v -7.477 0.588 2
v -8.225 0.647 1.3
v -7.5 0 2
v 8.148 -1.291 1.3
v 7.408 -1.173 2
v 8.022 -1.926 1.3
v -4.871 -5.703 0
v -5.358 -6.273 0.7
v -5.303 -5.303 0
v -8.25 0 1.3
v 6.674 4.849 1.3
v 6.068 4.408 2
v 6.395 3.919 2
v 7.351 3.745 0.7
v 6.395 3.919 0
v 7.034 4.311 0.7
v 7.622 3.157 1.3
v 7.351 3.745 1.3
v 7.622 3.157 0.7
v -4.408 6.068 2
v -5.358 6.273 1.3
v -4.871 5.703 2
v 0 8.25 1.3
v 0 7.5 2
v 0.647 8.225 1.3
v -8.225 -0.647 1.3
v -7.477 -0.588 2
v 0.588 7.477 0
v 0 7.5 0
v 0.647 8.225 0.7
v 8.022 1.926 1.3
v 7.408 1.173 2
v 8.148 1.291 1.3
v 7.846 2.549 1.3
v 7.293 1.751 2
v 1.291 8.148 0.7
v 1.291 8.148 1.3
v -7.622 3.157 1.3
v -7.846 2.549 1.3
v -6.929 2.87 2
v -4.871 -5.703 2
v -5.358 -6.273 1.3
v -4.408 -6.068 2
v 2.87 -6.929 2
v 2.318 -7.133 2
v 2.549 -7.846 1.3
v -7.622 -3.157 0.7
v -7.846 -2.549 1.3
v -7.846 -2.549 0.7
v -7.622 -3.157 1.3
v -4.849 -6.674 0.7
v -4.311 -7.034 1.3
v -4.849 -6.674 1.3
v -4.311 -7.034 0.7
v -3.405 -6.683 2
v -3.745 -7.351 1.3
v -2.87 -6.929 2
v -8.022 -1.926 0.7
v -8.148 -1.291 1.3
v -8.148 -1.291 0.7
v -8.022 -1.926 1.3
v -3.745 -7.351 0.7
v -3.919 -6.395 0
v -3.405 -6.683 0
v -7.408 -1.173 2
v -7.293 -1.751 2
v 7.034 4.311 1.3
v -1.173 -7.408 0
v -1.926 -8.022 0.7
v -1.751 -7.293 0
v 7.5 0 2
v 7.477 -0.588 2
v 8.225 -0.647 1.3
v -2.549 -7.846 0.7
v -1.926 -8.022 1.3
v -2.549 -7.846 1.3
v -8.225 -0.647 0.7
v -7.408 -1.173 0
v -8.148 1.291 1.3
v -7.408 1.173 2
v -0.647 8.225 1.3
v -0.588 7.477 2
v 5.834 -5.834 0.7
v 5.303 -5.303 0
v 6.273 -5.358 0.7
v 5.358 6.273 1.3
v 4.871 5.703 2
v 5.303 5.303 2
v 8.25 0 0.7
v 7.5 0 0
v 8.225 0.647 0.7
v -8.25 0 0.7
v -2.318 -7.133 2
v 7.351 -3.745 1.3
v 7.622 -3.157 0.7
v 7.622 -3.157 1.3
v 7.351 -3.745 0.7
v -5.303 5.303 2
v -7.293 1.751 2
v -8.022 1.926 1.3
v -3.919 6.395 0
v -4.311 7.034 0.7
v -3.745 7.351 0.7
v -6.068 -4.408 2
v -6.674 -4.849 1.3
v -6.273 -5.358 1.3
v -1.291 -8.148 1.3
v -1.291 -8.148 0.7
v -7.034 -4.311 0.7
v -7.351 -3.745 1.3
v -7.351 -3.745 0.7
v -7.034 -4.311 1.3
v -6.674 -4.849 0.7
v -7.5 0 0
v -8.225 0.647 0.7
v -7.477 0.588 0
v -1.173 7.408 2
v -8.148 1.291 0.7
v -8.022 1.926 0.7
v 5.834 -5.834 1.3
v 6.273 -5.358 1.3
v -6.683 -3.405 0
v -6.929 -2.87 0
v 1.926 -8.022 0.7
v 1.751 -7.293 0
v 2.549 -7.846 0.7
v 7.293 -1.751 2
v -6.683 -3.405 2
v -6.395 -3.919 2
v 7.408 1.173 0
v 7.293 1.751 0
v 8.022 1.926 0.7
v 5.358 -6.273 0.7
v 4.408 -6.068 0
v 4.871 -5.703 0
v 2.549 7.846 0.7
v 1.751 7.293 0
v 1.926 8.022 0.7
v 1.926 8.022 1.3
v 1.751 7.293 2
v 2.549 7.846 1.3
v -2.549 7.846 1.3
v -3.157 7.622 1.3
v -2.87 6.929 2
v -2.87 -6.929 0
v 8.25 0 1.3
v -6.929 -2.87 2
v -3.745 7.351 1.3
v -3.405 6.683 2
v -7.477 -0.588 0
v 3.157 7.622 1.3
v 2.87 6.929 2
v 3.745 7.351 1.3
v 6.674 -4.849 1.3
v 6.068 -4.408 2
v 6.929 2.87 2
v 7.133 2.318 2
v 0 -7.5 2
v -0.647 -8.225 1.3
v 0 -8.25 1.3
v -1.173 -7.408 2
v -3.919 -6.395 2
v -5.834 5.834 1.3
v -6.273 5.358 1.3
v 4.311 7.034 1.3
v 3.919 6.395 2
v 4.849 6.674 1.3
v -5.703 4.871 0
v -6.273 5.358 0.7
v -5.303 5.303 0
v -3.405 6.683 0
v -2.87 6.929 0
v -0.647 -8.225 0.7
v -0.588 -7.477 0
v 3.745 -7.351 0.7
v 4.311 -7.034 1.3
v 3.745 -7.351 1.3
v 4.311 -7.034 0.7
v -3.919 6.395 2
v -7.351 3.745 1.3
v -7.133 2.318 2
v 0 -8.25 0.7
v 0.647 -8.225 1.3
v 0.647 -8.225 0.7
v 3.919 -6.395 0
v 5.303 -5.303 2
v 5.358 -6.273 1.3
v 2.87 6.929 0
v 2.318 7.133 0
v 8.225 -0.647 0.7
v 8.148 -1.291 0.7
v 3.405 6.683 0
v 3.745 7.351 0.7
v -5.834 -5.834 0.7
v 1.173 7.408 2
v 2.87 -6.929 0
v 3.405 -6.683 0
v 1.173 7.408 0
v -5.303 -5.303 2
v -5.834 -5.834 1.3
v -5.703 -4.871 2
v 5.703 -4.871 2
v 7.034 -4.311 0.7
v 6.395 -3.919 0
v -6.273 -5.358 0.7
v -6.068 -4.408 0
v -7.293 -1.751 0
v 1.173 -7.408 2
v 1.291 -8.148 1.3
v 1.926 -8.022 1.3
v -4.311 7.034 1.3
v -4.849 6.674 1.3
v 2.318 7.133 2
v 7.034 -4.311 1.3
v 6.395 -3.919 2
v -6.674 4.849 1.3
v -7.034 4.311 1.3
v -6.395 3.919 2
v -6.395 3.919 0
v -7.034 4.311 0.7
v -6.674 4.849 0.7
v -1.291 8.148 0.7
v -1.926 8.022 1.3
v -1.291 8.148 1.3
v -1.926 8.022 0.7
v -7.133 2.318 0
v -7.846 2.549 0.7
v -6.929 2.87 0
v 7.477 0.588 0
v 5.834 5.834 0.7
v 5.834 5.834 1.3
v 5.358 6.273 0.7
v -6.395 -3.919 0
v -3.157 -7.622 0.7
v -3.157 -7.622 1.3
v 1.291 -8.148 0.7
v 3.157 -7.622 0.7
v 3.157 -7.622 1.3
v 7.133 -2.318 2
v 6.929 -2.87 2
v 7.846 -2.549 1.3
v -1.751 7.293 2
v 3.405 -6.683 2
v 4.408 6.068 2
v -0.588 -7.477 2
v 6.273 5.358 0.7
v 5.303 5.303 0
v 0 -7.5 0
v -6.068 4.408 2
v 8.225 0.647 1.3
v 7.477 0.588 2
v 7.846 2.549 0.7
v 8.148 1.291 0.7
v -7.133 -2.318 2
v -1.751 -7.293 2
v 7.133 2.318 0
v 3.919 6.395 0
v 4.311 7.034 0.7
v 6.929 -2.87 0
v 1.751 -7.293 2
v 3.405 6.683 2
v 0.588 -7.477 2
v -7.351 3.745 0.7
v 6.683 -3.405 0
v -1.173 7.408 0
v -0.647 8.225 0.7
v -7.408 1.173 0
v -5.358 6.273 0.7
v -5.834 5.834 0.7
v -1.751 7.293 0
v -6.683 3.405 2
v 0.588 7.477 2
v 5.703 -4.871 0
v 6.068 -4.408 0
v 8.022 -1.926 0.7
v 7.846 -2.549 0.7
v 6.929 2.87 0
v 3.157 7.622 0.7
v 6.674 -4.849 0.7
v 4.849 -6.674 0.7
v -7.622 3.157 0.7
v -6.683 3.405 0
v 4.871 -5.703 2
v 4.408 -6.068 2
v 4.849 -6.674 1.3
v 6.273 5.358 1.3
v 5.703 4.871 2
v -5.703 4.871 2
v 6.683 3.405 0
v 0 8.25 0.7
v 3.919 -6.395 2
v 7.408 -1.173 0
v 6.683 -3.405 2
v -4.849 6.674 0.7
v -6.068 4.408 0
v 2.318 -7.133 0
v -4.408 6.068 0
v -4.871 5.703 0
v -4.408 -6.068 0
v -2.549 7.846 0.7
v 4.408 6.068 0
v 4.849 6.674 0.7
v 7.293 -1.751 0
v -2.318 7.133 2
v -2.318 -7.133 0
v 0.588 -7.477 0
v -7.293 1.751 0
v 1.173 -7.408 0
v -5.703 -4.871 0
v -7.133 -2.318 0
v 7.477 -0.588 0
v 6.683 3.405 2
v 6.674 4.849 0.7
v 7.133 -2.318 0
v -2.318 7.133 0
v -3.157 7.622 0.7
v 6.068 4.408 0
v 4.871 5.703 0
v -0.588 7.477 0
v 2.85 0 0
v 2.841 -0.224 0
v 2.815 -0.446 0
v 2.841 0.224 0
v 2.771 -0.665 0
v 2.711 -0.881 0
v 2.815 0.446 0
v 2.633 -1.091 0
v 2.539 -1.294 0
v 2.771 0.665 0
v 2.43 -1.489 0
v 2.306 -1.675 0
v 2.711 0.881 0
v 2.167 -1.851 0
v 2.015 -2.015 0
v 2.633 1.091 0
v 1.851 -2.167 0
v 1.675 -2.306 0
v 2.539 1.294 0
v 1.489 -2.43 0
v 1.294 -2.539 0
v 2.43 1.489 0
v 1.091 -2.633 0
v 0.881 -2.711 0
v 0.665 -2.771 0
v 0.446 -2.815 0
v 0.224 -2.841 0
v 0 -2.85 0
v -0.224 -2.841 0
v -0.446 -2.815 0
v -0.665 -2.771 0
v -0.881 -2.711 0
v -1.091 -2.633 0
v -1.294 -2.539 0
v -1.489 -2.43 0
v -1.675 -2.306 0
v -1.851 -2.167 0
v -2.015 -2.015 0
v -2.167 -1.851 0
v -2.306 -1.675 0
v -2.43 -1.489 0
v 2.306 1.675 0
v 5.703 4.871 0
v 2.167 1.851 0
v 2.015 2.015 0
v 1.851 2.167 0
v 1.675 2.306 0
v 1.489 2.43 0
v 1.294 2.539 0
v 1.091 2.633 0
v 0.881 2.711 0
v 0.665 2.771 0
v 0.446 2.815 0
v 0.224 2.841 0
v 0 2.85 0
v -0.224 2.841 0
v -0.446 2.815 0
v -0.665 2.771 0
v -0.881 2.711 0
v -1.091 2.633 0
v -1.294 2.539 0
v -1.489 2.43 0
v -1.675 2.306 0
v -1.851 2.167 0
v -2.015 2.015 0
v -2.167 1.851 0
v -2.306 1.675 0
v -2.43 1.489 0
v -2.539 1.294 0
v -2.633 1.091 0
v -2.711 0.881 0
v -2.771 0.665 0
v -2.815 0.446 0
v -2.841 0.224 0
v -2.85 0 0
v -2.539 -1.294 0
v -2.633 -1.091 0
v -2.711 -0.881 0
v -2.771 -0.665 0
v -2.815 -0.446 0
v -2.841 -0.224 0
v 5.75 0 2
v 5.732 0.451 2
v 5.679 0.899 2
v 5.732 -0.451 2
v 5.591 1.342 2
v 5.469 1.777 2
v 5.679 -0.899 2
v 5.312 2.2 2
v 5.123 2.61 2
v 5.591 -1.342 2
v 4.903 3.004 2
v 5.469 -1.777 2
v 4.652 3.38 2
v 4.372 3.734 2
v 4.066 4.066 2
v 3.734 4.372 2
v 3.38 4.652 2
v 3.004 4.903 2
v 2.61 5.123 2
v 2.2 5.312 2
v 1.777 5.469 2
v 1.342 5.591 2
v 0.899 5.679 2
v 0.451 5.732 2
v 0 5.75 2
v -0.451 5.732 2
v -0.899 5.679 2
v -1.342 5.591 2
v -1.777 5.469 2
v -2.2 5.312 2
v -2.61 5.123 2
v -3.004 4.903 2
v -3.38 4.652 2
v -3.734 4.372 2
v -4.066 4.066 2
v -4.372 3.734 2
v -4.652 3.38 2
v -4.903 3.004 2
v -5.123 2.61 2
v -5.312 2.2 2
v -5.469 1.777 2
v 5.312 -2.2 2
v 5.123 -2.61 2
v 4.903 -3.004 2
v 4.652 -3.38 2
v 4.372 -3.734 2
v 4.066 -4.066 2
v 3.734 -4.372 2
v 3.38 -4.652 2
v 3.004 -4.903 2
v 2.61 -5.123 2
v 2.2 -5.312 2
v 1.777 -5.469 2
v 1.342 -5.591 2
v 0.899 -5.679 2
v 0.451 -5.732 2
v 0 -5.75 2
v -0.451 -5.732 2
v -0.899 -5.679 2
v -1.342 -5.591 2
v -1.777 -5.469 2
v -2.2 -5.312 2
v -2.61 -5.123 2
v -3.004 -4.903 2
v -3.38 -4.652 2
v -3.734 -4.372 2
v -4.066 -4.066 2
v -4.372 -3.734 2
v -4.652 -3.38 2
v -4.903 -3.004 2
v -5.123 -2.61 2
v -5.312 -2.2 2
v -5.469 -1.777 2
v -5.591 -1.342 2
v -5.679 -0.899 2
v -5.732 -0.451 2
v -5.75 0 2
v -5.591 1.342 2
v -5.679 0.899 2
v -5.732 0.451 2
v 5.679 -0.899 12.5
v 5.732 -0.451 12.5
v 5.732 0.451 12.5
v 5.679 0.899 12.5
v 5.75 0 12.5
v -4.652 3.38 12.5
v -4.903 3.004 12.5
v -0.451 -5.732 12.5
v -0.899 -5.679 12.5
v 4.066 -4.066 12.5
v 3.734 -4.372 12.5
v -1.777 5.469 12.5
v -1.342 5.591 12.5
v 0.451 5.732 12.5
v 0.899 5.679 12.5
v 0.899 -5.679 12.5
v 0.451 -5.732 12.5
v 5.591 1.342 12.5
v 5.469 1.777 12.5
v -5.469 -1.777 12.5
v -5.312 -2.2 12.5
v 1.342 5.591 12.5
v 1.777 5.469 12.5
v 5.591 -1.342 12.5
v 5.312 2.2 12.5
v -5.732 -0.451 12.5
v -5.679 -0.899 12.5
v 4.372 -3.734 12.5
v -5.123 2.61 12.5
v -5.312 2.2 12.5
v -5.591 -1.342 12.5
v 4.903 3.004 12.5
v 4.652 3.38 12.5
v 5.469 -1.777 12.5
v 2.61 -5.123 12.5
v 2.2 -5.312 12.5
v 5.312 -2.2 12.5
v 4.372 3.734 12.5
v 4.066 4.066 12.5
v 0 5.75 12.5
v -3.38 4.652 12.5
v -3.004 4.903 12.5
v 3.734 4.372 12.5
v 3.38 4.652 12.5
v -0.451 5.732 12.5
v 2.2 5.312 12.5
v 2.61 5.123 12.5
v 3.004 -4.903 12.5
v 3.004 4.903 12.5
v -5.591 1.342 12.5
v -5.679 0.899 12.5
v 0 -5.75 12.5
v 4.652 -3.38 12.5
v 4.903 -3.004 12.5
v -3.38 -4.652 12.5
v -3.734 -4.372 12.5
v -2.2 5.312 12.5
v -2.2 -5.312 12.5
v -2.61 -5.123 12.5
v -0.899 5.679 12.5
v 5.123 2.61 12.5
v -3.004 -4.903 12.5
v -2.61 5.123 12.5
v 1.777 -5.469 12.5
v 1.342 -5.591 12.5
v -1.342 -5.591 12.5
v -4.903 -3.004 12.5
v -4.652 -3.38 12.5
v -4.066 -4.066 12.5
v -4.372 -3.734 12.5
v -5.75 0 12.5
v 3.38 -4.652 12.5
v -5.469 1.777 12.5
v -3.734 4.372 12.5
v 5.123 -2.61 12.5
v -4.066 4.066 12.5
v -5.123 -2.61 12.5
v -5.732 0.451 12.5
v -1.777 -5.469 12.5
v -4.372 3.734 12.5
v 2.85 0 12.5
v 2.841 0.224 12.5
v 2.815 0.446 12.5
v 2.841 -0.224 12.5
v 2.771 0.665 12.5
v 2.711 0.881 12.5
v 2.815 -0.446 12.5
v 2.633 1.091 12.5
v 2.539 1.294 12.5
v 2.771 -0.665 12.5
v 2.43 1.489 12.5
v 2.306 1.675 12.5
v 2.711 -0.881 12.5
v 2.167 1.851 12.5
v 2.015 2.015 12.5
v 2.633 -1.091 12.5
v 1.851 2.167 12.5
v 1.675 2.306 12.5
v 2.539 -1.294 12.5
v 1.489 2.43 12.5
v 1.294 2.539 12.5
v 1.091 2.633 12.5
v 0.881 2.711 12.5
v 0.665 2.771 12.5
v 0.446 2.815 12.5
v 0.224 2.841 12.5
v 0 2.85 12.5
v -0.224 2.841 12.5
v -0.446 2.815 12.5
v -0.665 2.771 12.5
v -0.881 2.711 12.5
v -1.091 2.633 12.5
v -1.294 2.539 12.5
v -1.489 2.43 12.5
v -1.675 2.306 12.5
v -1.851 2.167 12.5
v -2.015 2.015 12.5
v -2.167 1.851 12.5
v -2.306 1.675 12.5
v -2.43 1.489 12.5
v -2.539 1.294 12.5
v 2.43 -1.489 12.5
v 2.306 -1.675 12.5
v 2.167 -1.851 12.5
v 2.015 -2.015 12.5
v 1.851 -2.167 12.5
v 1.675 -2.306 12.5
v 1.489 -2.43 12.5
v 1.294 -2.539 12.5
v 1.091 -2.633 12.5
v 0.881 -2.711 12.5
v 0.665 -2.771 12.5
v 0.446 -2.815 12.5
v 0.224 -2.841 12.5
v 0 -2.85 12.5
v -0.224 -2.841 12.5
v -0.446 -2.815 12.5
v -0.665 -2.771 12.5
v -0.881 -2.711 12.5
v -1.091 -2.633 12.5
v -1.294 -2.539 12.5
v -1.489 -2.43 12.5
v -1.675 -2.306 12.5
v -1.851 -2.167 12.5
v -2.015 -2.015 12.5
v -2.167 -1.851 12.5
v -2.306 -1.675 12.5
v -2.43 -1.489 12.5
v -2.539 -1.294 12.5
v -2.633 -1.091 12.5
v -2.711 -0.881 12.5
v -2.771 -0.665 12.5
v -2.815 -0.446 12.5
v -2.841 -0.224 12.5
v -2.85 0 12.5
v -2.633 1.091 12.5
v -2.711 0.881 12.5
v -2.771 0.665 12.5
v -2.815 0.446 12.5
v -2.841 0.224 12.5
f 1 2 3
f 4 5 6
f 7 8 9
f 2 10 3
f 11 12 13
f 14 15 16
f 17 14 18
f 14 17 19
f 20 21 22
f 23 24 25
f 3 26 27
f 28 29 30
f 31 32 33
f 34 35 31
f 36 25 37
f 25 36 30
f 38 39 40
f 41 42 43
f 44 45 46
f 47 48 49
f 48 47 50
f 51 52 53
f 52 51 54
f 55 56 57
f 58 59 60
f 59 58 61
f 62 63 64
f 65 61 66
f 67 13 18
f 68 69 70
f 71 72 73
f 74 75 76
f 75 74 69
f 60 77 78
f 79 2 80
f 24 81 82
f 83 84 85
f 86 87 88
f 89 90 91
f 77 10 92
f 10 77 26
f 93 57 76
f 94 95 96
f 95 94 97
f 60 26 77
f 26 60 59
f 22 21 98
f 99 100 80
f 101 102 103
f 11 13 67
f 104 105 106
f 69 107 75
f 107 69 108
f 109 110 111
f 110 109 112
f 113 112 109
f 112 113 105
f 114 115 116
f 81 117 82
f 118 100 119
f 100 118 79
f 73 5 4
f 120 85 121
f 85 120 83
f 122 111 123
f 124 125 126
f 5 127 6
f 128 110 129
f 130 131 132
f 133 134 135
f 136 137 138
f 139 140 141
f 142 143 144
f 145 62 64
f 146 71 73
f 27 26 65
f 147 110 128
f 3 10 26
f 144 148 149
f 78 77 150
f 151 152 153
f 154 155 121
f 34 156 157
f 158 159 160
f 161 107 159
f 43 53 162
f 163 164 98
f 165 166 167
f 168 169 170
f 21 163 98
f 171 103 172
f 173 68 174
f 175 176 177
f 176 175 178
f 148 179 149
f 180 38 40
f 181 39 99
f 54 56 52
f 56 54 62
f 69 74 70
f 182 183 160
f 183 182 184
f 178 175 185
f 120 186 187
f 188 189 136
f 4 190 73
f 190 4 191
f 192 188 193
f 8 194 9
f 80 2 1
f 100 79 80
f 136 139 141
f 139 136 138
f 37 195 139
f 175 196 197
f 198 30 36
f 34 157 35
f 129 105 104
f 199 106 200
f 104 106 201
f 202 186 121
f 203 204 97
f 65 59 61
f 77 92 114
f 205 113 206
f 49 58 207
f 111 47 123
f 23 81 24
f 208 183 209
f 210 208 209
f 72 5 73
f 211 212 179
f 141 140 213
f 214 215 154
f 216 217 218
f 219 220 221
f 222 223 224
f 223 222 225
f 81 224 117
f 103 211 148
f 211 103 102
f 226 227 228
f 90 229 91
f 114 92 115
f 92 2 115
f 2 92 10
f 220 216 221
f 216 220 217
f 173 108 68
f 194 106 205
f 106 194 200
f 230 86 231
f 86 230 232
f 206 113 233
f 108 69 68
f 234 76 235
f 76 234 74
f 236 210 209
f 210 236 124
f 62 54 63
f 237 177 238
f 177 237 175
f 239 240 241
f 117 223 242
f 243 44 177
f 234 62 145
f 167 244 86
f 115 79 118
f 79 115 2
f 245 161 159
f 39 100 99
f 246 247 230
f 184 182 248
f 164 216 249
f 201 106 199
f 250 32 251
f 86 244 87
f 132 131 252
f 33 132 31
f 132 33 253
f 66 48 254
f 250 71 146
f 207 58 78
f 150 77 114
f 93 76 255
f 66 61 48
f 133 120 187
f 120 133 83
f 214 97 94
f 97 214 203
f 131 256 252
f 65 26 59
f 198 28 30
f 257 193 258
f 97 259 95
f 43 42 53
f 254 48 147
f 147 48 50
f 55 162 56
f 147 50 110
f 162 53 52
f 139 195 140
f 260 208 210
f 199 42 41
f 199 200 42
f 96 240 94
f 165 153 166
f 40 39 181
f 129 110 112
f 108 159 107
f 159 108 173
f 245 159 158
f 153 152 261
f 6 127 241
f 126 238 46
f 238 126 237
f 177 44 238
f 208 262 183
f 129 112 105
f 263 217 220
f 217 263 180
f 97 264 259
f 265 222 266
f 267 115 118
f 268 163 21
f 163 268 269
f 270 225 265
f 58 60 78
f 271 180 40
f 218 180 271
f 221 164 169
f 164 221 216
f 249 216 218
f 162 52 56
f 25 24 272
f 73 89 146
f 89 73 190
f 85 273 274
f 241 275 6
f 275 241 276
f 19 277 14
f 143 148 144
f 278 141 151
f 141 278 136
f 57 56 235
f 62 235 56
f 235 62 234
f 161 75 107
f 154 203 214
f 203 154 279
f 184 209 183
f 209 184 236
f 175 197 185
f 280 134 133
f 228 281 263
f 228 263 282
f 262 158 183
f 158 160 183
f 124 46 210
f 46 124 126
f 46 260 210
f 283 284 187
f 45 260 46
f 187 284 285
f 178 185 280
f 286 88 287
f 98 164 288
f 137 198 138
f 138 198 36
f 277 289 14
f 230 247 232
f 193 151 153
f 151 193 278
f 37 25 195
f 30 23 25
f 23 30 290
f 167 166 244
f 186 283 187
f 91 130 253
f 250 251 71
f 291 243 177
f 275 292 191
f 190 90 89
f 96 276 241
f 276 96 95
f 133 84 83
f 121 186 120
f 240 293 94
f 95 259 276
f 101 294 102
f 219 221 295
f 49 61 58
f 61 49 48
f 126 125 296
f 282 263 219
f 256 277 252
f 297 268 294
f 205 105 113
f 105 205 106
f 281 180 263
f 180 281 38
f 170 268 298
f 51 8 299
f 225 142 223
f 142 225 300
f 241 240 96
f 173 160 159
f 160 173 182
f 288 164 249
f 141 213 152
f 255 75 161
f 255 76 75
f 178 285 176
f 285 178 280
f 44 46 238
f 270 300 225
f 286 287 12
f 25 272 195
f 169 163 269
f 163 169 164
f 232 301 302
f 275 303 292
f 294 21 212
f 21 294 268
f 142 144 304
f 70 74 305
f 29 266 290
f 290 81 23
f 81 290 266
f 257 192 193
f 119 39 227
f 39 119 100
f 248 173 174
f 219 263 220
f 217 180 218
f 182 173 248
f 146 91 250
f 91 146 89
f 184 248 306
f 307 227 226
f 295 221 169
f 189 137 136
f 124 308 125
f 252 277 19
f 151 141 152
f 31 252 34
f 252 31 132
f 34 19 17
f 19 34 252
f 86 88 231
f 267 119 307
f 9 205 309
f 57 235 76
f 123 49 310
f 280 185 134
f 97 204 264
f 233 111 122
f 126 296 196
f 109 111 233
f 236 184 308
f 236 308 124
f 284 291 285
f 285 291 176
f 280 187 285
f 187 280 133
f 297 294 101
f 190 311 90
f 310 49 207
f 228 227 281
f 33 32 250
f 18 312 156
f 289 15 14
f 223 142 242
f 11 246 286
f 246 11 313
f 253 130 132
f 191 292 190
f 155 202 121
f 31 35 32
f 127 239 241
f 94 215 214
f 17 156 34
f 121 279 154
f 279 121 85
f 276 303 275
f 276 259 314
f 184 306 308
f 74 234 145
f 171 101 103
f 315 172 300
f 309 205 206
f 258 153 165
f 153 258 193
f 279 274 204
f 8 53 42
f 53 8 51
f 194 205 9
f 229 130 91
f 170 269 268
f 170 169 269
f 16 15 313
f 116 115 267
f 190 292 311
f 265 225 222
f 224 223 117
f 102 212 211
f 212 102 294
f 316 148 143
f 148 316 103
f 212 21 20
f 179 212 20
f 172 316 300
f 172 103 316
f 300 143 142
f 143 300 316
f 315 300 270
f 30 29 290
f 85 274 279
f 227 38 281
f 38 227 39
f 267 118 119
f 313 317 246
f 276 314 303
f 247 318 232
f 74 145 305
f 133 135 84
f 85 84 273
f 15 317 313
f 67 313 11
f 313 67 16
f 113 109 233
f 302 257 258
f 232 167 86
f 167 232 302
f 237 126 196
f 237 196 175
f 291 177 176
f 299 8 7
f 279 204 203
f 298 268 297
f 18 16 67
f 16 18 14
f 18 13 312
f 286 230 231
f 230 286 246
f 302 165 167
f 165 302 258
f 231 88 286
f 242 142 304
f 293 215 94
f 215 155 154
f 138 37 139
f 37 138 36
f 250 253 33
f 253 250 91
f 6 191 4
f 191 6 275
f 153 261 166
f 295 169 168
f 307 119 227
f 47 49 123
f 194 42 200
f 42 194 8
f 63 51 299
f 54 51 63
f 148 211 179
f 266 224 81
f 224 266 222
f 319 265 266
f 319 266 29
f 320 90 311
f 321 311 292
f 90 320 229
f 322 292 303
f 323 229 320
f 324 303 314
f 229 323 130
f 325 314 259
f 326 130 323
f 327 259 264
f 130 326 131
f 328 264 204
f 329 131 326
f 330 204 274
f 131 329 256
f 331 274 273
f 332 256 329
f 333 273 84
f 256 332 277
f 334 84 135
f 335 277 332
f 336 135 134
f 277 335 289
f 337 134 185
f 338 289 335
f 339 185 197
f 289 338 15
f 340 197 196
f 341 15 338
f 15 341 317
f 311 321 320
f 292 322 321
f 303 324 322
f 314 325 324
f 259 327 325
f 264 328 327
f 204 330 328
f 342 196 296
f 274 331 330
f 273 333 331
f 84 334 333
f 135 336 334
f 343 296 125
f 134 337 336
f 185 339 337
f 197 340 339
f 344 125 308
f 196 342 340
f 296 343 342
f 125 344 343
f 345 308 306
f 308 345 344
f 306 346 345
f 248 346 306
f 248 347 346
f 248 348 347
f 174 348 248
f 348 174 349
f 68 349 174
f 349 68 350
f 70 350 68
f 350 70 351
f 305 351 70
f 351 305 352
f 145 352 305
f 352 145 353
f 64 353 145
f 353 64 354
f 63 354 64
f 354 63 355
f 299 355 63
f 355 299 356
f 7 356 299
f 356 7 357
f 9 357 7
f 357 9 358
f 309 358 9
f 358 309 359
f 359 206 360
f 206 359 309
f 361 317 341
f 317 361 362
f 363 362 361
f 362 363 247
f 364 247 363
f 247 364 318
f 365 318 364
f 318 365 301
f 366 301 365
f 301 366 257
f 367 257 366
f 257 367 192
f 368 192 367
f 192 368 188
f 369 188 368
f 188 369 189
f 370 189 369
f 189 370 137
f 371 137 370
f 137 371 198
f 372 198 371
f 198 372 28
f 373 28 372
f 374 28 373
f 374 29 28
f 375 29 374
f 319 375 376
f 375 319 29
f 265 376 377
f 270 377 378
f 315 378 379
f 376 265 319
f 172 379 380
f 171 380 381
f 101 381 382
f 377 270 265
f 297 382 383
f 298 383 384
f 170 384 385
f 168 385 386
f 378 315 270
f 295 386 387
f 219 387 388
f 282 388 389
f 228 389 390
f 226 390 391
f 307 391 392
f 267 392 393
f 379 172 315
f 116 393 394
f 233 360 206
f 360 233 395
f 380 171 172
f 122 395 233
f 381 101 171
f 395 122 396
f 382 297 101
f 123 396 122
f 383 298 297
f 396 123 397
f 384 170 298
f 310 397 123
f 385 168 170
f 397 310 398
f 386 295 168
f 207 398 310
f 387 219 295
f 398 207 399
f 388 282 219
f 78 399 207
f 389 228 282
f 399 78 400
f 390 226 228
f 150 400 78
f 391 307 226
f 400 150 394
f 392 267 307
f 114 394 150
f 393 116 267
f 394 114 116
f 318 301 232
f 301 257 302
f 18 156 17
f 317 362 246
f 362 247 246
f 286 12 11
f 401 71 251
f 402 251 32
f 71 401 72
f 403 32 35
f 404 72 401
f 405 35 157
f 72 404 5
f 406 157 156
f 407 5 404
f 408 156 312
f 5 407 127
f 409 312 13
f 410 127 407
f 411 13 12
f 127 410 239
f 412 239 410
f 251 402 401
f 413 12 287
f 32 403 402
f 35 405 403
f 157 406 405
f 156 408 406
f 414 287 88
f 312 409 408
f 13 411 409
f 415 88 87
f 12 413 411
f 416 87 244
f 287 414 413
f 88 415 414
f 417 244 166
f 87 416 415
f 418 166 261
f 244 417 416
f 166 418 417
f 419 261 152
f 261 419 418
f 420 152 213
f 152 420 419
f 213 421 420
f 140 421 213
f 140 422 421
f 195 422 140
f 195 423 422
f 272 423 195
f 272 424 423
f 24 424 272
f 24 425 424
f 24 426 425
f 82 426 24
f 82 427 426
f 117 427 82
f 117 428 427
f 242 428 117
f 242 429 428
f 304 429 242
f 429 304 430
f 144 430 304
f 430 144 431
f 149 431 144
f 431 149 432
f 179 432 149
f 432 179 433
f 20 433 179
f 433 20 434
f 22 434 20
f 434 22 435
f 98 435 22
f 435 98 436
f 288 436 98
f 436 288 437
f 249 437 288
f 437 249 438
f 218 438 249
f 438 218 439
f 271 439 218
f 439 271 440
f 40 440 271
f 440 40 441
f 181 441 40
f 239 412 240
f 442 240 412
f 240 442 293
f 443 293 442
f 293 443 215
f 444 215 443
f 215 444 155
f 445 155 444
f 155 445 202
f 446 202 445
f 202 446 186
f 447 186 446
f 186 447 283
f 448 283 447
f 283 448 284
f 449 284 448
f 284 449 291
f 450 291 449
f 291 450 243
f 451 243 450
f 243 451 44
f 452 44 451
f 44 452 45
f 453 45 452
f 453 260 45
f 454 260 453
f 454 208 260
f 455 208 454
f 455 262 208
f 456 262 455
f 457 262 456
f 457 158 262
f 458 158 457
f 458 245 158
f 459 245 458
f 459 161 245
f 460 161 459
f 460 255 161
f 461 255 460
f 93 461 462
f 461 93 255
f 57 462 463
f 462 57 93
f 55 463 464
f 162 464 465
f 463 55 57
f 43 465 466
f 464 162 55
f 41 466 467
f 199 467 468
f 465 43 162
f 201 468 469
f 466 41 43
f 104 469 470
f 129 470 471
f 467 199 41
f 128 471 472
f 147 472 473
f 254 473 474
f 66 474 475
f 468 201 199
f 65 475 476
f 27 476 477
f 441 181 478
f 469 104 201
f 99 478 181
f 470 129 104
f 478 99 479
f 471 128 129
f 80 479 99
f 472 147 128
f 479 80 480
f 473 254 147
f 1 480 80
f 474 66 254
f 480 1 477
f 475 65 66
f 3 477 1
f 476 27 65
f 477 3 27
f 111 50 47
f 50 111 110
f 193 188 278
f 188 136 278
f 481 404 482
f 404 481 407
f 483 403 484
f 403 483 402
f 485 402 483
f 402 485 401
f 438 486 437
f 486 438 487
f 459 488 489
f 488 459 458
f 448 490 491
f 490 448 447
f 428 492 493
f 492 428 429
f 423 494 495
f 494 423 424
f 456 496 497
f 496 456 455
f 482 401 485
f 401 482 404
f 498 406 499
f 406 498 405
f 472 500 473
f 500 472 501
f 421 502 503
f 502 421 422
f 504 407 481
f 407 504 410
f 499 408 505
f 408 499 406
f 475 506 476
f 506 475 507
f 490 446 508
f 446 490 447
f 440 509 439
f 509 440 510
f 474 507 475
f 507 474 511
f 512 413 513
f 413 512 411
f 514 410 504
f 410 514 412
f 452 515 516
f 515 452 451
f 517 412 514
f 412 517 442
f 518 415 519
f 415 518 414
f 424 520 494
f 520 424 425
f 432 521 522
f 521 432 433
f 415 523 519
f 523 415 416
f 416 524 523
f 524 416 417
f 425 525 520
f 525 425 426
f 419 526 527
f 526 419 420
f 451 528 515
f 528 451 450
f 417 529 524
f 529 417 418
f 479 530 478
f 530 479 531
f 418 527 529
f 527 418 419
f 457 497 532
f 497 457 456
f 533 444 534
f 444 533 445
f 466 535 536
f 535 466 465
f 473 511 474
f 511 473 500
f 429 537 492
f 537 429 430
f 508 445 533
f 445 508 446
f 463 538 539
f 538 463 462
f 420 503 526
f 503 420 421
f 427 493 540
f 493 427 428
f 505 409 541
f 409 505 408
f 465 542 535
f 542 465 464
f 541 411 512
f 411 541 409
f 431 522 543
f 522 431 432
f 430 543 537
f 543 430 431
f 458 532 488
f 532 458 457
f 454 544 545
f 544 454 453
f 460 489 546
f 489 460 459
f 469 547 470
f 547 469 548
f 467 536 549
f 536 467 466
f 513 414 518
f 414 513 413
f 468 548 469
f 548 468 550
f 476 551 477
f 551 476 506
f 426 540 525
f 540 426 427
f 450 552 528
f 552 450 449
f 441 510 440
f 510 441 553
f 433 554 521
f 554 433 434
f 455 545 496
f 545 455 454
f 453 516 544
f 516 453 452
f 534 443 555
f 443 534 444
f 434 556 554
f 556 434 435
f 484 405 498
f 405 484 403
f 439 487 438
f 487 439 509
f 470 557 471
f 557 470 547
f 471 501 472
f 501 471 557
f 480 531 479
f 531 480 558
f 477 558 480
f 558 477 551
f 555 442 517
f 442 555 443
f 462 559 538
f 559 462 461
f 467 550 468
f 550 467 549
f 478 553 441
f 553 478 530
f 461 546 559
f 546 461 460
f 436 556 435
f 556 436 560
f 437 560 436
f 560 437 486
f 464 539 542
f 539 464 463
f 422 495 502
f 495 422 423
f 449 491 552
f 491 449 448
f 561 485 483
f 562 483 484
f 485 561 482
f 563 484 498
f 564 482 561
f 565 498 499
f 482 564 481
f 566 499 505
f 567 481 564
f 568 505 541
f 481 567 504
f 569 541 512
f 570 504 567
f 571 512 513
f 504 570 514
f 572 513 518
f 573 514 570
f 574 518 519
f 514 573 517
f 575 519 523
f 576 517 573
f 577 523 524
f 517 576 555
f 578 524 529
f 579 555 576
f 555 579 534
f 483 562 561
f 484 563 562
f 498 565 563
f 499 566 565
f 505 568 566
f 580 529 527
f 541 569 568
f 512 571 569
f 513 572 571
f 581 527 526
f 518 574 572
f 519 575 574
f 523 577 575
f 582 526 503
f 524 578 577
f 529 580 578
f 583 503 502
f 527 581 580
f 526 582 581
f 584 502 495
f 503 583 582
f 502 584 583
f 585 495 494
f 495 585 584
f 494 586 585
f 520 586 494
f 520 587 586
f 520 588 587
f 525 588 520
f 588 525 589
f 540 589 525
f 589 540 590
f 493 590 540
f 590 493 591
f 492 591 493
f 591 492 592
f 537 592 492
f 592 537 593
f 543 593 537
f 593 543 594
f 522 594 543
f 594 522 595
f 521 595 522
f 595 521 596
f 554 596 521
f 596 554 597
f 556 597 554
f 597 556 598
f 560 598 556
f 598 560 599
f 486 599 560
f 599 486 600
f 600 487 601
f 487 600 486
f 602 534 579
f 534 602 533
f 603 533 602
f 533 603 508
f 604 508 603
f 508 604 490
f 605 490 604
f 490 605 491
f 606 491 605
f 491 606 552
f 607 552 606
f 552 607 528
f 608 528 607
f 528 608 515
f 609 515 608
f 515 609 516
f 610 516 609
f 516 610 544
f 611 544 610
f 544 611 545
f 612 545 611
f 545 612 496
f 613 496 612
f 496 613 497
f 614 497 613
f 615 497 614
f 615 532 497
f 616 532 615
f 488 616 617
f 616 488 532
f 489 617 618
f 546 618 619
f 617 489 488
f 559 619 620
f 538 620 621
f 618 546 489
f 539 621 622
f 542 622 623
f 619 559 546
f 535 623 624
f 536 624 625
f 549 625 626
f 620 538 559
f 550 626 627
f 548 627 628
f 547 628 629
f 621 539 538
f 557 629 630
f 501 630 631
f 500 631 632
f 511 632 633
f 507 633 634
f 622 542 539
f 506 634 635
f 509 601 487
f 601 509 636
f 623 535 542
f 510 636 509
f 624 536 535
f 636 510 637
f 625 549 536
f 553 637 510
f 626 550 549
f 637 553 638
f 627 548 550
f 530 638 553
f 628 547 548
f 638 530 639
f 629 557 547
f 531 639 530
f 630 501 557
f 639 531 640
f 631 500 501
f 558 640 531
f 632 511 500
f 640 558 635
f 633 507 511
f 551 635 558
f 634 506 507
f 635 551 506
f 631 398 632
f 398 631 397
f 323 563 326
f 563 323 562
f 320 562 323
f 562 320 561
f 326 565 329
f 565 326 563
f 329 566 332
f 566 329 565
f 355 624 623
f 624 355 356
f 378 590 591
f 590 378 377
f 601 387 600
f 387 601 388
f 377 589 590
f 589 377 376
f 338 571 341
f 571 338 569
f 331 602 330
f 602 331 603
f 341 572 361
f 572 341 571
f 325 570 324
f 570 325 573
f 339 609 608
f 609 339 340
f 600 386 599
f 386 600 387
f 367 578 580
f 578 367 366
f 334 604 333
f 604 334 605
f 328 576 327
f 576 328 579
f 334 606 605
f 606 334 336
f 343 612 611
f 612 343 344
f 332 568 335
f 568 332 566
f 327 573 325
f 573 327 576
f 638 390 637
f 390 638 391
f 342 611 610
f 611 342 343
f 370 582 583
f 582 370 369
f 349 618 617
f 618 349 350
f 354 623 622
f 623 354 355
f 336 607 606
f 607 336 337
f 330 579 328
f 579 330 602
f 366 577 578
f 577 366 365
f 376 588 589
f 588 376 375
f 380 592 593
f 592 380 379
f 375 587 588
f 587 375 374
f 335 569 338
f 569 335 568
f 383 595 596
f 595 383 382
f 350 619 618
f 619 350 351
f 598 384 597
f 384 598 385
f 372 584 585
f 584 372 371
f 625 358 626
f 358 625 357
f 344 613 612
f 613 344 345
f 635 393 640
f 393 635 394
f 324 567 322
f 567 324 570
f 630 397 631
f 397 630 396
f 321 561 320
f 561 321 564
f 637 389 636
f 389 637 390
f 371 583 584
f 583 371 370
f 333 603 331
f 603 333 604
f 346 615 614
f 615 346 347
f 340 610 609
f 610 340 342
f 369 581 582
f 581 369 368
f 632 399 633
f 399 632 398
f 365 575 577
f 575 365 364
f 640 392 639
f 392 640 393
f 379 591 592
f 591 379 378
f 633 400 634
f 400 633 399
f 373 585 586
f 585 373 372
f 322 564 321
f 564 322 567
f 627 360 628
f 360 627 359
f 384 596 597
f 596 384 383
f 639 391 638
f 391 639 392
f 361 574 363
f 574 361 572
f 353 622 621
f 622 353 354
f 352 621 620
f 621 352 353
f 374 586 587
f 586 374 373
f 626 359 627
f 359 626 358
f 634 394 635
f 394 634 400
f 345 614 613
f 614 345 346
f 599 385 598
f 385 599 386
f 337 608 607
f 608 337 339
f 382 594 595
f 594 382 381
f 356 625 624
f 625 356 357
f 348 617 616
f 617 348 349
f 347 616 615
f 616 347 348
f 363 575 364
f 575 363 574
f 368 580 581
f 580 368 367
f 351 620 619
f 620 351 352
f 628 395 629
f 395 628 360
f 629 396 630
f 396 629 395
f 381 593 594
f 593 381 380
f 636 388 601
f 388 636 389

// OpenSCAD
// plotter pen adapter for Sharpie Fine Point markers
// created January, 2014 by Brian Boucheron <brian@boucheron.org>

band_full_thickness = 2;    // thickest point of the band
band_edge_thickness = 0.6;  // thinnest point of the band
band_full_diameter = 16.5;  // diameter at widest point of band
band_edge_diameter = 15;    // diameter where band starts to angle in


// sharpie outer diameter measured at 10.64mm
// plotter outer diameter measured at 11.50mm
body_outer_diameter = 11.5; // outer diameter of the main body
body_inner_diameter = 5.7; // inner diameter of the main body

profile = [
    [0,0],
    [band_edge_diameter / 2, 0],
    [band_full_diameter / 2, (band_full_thickness - band_edge_thickness) / 2],
    [band_full_diameter / 2, band_full_thickness - ((band_full_thickness - band_edge_thickness) / 2)],
    [band_edge_diameter / 2, band_full_thickness],
    [0,band_full_thickness],
    // end body
];

difference() {
	union() {
		rotate_extrude($fn=80) polygon(points=profile);
		cylinder(r=body_outer_diameter/2, h=12.5, $fn=80);
	}

	#translate([0,0,-25]) cylinder(r=body_inner_diameter/2, h=50, $fn=80);
}
